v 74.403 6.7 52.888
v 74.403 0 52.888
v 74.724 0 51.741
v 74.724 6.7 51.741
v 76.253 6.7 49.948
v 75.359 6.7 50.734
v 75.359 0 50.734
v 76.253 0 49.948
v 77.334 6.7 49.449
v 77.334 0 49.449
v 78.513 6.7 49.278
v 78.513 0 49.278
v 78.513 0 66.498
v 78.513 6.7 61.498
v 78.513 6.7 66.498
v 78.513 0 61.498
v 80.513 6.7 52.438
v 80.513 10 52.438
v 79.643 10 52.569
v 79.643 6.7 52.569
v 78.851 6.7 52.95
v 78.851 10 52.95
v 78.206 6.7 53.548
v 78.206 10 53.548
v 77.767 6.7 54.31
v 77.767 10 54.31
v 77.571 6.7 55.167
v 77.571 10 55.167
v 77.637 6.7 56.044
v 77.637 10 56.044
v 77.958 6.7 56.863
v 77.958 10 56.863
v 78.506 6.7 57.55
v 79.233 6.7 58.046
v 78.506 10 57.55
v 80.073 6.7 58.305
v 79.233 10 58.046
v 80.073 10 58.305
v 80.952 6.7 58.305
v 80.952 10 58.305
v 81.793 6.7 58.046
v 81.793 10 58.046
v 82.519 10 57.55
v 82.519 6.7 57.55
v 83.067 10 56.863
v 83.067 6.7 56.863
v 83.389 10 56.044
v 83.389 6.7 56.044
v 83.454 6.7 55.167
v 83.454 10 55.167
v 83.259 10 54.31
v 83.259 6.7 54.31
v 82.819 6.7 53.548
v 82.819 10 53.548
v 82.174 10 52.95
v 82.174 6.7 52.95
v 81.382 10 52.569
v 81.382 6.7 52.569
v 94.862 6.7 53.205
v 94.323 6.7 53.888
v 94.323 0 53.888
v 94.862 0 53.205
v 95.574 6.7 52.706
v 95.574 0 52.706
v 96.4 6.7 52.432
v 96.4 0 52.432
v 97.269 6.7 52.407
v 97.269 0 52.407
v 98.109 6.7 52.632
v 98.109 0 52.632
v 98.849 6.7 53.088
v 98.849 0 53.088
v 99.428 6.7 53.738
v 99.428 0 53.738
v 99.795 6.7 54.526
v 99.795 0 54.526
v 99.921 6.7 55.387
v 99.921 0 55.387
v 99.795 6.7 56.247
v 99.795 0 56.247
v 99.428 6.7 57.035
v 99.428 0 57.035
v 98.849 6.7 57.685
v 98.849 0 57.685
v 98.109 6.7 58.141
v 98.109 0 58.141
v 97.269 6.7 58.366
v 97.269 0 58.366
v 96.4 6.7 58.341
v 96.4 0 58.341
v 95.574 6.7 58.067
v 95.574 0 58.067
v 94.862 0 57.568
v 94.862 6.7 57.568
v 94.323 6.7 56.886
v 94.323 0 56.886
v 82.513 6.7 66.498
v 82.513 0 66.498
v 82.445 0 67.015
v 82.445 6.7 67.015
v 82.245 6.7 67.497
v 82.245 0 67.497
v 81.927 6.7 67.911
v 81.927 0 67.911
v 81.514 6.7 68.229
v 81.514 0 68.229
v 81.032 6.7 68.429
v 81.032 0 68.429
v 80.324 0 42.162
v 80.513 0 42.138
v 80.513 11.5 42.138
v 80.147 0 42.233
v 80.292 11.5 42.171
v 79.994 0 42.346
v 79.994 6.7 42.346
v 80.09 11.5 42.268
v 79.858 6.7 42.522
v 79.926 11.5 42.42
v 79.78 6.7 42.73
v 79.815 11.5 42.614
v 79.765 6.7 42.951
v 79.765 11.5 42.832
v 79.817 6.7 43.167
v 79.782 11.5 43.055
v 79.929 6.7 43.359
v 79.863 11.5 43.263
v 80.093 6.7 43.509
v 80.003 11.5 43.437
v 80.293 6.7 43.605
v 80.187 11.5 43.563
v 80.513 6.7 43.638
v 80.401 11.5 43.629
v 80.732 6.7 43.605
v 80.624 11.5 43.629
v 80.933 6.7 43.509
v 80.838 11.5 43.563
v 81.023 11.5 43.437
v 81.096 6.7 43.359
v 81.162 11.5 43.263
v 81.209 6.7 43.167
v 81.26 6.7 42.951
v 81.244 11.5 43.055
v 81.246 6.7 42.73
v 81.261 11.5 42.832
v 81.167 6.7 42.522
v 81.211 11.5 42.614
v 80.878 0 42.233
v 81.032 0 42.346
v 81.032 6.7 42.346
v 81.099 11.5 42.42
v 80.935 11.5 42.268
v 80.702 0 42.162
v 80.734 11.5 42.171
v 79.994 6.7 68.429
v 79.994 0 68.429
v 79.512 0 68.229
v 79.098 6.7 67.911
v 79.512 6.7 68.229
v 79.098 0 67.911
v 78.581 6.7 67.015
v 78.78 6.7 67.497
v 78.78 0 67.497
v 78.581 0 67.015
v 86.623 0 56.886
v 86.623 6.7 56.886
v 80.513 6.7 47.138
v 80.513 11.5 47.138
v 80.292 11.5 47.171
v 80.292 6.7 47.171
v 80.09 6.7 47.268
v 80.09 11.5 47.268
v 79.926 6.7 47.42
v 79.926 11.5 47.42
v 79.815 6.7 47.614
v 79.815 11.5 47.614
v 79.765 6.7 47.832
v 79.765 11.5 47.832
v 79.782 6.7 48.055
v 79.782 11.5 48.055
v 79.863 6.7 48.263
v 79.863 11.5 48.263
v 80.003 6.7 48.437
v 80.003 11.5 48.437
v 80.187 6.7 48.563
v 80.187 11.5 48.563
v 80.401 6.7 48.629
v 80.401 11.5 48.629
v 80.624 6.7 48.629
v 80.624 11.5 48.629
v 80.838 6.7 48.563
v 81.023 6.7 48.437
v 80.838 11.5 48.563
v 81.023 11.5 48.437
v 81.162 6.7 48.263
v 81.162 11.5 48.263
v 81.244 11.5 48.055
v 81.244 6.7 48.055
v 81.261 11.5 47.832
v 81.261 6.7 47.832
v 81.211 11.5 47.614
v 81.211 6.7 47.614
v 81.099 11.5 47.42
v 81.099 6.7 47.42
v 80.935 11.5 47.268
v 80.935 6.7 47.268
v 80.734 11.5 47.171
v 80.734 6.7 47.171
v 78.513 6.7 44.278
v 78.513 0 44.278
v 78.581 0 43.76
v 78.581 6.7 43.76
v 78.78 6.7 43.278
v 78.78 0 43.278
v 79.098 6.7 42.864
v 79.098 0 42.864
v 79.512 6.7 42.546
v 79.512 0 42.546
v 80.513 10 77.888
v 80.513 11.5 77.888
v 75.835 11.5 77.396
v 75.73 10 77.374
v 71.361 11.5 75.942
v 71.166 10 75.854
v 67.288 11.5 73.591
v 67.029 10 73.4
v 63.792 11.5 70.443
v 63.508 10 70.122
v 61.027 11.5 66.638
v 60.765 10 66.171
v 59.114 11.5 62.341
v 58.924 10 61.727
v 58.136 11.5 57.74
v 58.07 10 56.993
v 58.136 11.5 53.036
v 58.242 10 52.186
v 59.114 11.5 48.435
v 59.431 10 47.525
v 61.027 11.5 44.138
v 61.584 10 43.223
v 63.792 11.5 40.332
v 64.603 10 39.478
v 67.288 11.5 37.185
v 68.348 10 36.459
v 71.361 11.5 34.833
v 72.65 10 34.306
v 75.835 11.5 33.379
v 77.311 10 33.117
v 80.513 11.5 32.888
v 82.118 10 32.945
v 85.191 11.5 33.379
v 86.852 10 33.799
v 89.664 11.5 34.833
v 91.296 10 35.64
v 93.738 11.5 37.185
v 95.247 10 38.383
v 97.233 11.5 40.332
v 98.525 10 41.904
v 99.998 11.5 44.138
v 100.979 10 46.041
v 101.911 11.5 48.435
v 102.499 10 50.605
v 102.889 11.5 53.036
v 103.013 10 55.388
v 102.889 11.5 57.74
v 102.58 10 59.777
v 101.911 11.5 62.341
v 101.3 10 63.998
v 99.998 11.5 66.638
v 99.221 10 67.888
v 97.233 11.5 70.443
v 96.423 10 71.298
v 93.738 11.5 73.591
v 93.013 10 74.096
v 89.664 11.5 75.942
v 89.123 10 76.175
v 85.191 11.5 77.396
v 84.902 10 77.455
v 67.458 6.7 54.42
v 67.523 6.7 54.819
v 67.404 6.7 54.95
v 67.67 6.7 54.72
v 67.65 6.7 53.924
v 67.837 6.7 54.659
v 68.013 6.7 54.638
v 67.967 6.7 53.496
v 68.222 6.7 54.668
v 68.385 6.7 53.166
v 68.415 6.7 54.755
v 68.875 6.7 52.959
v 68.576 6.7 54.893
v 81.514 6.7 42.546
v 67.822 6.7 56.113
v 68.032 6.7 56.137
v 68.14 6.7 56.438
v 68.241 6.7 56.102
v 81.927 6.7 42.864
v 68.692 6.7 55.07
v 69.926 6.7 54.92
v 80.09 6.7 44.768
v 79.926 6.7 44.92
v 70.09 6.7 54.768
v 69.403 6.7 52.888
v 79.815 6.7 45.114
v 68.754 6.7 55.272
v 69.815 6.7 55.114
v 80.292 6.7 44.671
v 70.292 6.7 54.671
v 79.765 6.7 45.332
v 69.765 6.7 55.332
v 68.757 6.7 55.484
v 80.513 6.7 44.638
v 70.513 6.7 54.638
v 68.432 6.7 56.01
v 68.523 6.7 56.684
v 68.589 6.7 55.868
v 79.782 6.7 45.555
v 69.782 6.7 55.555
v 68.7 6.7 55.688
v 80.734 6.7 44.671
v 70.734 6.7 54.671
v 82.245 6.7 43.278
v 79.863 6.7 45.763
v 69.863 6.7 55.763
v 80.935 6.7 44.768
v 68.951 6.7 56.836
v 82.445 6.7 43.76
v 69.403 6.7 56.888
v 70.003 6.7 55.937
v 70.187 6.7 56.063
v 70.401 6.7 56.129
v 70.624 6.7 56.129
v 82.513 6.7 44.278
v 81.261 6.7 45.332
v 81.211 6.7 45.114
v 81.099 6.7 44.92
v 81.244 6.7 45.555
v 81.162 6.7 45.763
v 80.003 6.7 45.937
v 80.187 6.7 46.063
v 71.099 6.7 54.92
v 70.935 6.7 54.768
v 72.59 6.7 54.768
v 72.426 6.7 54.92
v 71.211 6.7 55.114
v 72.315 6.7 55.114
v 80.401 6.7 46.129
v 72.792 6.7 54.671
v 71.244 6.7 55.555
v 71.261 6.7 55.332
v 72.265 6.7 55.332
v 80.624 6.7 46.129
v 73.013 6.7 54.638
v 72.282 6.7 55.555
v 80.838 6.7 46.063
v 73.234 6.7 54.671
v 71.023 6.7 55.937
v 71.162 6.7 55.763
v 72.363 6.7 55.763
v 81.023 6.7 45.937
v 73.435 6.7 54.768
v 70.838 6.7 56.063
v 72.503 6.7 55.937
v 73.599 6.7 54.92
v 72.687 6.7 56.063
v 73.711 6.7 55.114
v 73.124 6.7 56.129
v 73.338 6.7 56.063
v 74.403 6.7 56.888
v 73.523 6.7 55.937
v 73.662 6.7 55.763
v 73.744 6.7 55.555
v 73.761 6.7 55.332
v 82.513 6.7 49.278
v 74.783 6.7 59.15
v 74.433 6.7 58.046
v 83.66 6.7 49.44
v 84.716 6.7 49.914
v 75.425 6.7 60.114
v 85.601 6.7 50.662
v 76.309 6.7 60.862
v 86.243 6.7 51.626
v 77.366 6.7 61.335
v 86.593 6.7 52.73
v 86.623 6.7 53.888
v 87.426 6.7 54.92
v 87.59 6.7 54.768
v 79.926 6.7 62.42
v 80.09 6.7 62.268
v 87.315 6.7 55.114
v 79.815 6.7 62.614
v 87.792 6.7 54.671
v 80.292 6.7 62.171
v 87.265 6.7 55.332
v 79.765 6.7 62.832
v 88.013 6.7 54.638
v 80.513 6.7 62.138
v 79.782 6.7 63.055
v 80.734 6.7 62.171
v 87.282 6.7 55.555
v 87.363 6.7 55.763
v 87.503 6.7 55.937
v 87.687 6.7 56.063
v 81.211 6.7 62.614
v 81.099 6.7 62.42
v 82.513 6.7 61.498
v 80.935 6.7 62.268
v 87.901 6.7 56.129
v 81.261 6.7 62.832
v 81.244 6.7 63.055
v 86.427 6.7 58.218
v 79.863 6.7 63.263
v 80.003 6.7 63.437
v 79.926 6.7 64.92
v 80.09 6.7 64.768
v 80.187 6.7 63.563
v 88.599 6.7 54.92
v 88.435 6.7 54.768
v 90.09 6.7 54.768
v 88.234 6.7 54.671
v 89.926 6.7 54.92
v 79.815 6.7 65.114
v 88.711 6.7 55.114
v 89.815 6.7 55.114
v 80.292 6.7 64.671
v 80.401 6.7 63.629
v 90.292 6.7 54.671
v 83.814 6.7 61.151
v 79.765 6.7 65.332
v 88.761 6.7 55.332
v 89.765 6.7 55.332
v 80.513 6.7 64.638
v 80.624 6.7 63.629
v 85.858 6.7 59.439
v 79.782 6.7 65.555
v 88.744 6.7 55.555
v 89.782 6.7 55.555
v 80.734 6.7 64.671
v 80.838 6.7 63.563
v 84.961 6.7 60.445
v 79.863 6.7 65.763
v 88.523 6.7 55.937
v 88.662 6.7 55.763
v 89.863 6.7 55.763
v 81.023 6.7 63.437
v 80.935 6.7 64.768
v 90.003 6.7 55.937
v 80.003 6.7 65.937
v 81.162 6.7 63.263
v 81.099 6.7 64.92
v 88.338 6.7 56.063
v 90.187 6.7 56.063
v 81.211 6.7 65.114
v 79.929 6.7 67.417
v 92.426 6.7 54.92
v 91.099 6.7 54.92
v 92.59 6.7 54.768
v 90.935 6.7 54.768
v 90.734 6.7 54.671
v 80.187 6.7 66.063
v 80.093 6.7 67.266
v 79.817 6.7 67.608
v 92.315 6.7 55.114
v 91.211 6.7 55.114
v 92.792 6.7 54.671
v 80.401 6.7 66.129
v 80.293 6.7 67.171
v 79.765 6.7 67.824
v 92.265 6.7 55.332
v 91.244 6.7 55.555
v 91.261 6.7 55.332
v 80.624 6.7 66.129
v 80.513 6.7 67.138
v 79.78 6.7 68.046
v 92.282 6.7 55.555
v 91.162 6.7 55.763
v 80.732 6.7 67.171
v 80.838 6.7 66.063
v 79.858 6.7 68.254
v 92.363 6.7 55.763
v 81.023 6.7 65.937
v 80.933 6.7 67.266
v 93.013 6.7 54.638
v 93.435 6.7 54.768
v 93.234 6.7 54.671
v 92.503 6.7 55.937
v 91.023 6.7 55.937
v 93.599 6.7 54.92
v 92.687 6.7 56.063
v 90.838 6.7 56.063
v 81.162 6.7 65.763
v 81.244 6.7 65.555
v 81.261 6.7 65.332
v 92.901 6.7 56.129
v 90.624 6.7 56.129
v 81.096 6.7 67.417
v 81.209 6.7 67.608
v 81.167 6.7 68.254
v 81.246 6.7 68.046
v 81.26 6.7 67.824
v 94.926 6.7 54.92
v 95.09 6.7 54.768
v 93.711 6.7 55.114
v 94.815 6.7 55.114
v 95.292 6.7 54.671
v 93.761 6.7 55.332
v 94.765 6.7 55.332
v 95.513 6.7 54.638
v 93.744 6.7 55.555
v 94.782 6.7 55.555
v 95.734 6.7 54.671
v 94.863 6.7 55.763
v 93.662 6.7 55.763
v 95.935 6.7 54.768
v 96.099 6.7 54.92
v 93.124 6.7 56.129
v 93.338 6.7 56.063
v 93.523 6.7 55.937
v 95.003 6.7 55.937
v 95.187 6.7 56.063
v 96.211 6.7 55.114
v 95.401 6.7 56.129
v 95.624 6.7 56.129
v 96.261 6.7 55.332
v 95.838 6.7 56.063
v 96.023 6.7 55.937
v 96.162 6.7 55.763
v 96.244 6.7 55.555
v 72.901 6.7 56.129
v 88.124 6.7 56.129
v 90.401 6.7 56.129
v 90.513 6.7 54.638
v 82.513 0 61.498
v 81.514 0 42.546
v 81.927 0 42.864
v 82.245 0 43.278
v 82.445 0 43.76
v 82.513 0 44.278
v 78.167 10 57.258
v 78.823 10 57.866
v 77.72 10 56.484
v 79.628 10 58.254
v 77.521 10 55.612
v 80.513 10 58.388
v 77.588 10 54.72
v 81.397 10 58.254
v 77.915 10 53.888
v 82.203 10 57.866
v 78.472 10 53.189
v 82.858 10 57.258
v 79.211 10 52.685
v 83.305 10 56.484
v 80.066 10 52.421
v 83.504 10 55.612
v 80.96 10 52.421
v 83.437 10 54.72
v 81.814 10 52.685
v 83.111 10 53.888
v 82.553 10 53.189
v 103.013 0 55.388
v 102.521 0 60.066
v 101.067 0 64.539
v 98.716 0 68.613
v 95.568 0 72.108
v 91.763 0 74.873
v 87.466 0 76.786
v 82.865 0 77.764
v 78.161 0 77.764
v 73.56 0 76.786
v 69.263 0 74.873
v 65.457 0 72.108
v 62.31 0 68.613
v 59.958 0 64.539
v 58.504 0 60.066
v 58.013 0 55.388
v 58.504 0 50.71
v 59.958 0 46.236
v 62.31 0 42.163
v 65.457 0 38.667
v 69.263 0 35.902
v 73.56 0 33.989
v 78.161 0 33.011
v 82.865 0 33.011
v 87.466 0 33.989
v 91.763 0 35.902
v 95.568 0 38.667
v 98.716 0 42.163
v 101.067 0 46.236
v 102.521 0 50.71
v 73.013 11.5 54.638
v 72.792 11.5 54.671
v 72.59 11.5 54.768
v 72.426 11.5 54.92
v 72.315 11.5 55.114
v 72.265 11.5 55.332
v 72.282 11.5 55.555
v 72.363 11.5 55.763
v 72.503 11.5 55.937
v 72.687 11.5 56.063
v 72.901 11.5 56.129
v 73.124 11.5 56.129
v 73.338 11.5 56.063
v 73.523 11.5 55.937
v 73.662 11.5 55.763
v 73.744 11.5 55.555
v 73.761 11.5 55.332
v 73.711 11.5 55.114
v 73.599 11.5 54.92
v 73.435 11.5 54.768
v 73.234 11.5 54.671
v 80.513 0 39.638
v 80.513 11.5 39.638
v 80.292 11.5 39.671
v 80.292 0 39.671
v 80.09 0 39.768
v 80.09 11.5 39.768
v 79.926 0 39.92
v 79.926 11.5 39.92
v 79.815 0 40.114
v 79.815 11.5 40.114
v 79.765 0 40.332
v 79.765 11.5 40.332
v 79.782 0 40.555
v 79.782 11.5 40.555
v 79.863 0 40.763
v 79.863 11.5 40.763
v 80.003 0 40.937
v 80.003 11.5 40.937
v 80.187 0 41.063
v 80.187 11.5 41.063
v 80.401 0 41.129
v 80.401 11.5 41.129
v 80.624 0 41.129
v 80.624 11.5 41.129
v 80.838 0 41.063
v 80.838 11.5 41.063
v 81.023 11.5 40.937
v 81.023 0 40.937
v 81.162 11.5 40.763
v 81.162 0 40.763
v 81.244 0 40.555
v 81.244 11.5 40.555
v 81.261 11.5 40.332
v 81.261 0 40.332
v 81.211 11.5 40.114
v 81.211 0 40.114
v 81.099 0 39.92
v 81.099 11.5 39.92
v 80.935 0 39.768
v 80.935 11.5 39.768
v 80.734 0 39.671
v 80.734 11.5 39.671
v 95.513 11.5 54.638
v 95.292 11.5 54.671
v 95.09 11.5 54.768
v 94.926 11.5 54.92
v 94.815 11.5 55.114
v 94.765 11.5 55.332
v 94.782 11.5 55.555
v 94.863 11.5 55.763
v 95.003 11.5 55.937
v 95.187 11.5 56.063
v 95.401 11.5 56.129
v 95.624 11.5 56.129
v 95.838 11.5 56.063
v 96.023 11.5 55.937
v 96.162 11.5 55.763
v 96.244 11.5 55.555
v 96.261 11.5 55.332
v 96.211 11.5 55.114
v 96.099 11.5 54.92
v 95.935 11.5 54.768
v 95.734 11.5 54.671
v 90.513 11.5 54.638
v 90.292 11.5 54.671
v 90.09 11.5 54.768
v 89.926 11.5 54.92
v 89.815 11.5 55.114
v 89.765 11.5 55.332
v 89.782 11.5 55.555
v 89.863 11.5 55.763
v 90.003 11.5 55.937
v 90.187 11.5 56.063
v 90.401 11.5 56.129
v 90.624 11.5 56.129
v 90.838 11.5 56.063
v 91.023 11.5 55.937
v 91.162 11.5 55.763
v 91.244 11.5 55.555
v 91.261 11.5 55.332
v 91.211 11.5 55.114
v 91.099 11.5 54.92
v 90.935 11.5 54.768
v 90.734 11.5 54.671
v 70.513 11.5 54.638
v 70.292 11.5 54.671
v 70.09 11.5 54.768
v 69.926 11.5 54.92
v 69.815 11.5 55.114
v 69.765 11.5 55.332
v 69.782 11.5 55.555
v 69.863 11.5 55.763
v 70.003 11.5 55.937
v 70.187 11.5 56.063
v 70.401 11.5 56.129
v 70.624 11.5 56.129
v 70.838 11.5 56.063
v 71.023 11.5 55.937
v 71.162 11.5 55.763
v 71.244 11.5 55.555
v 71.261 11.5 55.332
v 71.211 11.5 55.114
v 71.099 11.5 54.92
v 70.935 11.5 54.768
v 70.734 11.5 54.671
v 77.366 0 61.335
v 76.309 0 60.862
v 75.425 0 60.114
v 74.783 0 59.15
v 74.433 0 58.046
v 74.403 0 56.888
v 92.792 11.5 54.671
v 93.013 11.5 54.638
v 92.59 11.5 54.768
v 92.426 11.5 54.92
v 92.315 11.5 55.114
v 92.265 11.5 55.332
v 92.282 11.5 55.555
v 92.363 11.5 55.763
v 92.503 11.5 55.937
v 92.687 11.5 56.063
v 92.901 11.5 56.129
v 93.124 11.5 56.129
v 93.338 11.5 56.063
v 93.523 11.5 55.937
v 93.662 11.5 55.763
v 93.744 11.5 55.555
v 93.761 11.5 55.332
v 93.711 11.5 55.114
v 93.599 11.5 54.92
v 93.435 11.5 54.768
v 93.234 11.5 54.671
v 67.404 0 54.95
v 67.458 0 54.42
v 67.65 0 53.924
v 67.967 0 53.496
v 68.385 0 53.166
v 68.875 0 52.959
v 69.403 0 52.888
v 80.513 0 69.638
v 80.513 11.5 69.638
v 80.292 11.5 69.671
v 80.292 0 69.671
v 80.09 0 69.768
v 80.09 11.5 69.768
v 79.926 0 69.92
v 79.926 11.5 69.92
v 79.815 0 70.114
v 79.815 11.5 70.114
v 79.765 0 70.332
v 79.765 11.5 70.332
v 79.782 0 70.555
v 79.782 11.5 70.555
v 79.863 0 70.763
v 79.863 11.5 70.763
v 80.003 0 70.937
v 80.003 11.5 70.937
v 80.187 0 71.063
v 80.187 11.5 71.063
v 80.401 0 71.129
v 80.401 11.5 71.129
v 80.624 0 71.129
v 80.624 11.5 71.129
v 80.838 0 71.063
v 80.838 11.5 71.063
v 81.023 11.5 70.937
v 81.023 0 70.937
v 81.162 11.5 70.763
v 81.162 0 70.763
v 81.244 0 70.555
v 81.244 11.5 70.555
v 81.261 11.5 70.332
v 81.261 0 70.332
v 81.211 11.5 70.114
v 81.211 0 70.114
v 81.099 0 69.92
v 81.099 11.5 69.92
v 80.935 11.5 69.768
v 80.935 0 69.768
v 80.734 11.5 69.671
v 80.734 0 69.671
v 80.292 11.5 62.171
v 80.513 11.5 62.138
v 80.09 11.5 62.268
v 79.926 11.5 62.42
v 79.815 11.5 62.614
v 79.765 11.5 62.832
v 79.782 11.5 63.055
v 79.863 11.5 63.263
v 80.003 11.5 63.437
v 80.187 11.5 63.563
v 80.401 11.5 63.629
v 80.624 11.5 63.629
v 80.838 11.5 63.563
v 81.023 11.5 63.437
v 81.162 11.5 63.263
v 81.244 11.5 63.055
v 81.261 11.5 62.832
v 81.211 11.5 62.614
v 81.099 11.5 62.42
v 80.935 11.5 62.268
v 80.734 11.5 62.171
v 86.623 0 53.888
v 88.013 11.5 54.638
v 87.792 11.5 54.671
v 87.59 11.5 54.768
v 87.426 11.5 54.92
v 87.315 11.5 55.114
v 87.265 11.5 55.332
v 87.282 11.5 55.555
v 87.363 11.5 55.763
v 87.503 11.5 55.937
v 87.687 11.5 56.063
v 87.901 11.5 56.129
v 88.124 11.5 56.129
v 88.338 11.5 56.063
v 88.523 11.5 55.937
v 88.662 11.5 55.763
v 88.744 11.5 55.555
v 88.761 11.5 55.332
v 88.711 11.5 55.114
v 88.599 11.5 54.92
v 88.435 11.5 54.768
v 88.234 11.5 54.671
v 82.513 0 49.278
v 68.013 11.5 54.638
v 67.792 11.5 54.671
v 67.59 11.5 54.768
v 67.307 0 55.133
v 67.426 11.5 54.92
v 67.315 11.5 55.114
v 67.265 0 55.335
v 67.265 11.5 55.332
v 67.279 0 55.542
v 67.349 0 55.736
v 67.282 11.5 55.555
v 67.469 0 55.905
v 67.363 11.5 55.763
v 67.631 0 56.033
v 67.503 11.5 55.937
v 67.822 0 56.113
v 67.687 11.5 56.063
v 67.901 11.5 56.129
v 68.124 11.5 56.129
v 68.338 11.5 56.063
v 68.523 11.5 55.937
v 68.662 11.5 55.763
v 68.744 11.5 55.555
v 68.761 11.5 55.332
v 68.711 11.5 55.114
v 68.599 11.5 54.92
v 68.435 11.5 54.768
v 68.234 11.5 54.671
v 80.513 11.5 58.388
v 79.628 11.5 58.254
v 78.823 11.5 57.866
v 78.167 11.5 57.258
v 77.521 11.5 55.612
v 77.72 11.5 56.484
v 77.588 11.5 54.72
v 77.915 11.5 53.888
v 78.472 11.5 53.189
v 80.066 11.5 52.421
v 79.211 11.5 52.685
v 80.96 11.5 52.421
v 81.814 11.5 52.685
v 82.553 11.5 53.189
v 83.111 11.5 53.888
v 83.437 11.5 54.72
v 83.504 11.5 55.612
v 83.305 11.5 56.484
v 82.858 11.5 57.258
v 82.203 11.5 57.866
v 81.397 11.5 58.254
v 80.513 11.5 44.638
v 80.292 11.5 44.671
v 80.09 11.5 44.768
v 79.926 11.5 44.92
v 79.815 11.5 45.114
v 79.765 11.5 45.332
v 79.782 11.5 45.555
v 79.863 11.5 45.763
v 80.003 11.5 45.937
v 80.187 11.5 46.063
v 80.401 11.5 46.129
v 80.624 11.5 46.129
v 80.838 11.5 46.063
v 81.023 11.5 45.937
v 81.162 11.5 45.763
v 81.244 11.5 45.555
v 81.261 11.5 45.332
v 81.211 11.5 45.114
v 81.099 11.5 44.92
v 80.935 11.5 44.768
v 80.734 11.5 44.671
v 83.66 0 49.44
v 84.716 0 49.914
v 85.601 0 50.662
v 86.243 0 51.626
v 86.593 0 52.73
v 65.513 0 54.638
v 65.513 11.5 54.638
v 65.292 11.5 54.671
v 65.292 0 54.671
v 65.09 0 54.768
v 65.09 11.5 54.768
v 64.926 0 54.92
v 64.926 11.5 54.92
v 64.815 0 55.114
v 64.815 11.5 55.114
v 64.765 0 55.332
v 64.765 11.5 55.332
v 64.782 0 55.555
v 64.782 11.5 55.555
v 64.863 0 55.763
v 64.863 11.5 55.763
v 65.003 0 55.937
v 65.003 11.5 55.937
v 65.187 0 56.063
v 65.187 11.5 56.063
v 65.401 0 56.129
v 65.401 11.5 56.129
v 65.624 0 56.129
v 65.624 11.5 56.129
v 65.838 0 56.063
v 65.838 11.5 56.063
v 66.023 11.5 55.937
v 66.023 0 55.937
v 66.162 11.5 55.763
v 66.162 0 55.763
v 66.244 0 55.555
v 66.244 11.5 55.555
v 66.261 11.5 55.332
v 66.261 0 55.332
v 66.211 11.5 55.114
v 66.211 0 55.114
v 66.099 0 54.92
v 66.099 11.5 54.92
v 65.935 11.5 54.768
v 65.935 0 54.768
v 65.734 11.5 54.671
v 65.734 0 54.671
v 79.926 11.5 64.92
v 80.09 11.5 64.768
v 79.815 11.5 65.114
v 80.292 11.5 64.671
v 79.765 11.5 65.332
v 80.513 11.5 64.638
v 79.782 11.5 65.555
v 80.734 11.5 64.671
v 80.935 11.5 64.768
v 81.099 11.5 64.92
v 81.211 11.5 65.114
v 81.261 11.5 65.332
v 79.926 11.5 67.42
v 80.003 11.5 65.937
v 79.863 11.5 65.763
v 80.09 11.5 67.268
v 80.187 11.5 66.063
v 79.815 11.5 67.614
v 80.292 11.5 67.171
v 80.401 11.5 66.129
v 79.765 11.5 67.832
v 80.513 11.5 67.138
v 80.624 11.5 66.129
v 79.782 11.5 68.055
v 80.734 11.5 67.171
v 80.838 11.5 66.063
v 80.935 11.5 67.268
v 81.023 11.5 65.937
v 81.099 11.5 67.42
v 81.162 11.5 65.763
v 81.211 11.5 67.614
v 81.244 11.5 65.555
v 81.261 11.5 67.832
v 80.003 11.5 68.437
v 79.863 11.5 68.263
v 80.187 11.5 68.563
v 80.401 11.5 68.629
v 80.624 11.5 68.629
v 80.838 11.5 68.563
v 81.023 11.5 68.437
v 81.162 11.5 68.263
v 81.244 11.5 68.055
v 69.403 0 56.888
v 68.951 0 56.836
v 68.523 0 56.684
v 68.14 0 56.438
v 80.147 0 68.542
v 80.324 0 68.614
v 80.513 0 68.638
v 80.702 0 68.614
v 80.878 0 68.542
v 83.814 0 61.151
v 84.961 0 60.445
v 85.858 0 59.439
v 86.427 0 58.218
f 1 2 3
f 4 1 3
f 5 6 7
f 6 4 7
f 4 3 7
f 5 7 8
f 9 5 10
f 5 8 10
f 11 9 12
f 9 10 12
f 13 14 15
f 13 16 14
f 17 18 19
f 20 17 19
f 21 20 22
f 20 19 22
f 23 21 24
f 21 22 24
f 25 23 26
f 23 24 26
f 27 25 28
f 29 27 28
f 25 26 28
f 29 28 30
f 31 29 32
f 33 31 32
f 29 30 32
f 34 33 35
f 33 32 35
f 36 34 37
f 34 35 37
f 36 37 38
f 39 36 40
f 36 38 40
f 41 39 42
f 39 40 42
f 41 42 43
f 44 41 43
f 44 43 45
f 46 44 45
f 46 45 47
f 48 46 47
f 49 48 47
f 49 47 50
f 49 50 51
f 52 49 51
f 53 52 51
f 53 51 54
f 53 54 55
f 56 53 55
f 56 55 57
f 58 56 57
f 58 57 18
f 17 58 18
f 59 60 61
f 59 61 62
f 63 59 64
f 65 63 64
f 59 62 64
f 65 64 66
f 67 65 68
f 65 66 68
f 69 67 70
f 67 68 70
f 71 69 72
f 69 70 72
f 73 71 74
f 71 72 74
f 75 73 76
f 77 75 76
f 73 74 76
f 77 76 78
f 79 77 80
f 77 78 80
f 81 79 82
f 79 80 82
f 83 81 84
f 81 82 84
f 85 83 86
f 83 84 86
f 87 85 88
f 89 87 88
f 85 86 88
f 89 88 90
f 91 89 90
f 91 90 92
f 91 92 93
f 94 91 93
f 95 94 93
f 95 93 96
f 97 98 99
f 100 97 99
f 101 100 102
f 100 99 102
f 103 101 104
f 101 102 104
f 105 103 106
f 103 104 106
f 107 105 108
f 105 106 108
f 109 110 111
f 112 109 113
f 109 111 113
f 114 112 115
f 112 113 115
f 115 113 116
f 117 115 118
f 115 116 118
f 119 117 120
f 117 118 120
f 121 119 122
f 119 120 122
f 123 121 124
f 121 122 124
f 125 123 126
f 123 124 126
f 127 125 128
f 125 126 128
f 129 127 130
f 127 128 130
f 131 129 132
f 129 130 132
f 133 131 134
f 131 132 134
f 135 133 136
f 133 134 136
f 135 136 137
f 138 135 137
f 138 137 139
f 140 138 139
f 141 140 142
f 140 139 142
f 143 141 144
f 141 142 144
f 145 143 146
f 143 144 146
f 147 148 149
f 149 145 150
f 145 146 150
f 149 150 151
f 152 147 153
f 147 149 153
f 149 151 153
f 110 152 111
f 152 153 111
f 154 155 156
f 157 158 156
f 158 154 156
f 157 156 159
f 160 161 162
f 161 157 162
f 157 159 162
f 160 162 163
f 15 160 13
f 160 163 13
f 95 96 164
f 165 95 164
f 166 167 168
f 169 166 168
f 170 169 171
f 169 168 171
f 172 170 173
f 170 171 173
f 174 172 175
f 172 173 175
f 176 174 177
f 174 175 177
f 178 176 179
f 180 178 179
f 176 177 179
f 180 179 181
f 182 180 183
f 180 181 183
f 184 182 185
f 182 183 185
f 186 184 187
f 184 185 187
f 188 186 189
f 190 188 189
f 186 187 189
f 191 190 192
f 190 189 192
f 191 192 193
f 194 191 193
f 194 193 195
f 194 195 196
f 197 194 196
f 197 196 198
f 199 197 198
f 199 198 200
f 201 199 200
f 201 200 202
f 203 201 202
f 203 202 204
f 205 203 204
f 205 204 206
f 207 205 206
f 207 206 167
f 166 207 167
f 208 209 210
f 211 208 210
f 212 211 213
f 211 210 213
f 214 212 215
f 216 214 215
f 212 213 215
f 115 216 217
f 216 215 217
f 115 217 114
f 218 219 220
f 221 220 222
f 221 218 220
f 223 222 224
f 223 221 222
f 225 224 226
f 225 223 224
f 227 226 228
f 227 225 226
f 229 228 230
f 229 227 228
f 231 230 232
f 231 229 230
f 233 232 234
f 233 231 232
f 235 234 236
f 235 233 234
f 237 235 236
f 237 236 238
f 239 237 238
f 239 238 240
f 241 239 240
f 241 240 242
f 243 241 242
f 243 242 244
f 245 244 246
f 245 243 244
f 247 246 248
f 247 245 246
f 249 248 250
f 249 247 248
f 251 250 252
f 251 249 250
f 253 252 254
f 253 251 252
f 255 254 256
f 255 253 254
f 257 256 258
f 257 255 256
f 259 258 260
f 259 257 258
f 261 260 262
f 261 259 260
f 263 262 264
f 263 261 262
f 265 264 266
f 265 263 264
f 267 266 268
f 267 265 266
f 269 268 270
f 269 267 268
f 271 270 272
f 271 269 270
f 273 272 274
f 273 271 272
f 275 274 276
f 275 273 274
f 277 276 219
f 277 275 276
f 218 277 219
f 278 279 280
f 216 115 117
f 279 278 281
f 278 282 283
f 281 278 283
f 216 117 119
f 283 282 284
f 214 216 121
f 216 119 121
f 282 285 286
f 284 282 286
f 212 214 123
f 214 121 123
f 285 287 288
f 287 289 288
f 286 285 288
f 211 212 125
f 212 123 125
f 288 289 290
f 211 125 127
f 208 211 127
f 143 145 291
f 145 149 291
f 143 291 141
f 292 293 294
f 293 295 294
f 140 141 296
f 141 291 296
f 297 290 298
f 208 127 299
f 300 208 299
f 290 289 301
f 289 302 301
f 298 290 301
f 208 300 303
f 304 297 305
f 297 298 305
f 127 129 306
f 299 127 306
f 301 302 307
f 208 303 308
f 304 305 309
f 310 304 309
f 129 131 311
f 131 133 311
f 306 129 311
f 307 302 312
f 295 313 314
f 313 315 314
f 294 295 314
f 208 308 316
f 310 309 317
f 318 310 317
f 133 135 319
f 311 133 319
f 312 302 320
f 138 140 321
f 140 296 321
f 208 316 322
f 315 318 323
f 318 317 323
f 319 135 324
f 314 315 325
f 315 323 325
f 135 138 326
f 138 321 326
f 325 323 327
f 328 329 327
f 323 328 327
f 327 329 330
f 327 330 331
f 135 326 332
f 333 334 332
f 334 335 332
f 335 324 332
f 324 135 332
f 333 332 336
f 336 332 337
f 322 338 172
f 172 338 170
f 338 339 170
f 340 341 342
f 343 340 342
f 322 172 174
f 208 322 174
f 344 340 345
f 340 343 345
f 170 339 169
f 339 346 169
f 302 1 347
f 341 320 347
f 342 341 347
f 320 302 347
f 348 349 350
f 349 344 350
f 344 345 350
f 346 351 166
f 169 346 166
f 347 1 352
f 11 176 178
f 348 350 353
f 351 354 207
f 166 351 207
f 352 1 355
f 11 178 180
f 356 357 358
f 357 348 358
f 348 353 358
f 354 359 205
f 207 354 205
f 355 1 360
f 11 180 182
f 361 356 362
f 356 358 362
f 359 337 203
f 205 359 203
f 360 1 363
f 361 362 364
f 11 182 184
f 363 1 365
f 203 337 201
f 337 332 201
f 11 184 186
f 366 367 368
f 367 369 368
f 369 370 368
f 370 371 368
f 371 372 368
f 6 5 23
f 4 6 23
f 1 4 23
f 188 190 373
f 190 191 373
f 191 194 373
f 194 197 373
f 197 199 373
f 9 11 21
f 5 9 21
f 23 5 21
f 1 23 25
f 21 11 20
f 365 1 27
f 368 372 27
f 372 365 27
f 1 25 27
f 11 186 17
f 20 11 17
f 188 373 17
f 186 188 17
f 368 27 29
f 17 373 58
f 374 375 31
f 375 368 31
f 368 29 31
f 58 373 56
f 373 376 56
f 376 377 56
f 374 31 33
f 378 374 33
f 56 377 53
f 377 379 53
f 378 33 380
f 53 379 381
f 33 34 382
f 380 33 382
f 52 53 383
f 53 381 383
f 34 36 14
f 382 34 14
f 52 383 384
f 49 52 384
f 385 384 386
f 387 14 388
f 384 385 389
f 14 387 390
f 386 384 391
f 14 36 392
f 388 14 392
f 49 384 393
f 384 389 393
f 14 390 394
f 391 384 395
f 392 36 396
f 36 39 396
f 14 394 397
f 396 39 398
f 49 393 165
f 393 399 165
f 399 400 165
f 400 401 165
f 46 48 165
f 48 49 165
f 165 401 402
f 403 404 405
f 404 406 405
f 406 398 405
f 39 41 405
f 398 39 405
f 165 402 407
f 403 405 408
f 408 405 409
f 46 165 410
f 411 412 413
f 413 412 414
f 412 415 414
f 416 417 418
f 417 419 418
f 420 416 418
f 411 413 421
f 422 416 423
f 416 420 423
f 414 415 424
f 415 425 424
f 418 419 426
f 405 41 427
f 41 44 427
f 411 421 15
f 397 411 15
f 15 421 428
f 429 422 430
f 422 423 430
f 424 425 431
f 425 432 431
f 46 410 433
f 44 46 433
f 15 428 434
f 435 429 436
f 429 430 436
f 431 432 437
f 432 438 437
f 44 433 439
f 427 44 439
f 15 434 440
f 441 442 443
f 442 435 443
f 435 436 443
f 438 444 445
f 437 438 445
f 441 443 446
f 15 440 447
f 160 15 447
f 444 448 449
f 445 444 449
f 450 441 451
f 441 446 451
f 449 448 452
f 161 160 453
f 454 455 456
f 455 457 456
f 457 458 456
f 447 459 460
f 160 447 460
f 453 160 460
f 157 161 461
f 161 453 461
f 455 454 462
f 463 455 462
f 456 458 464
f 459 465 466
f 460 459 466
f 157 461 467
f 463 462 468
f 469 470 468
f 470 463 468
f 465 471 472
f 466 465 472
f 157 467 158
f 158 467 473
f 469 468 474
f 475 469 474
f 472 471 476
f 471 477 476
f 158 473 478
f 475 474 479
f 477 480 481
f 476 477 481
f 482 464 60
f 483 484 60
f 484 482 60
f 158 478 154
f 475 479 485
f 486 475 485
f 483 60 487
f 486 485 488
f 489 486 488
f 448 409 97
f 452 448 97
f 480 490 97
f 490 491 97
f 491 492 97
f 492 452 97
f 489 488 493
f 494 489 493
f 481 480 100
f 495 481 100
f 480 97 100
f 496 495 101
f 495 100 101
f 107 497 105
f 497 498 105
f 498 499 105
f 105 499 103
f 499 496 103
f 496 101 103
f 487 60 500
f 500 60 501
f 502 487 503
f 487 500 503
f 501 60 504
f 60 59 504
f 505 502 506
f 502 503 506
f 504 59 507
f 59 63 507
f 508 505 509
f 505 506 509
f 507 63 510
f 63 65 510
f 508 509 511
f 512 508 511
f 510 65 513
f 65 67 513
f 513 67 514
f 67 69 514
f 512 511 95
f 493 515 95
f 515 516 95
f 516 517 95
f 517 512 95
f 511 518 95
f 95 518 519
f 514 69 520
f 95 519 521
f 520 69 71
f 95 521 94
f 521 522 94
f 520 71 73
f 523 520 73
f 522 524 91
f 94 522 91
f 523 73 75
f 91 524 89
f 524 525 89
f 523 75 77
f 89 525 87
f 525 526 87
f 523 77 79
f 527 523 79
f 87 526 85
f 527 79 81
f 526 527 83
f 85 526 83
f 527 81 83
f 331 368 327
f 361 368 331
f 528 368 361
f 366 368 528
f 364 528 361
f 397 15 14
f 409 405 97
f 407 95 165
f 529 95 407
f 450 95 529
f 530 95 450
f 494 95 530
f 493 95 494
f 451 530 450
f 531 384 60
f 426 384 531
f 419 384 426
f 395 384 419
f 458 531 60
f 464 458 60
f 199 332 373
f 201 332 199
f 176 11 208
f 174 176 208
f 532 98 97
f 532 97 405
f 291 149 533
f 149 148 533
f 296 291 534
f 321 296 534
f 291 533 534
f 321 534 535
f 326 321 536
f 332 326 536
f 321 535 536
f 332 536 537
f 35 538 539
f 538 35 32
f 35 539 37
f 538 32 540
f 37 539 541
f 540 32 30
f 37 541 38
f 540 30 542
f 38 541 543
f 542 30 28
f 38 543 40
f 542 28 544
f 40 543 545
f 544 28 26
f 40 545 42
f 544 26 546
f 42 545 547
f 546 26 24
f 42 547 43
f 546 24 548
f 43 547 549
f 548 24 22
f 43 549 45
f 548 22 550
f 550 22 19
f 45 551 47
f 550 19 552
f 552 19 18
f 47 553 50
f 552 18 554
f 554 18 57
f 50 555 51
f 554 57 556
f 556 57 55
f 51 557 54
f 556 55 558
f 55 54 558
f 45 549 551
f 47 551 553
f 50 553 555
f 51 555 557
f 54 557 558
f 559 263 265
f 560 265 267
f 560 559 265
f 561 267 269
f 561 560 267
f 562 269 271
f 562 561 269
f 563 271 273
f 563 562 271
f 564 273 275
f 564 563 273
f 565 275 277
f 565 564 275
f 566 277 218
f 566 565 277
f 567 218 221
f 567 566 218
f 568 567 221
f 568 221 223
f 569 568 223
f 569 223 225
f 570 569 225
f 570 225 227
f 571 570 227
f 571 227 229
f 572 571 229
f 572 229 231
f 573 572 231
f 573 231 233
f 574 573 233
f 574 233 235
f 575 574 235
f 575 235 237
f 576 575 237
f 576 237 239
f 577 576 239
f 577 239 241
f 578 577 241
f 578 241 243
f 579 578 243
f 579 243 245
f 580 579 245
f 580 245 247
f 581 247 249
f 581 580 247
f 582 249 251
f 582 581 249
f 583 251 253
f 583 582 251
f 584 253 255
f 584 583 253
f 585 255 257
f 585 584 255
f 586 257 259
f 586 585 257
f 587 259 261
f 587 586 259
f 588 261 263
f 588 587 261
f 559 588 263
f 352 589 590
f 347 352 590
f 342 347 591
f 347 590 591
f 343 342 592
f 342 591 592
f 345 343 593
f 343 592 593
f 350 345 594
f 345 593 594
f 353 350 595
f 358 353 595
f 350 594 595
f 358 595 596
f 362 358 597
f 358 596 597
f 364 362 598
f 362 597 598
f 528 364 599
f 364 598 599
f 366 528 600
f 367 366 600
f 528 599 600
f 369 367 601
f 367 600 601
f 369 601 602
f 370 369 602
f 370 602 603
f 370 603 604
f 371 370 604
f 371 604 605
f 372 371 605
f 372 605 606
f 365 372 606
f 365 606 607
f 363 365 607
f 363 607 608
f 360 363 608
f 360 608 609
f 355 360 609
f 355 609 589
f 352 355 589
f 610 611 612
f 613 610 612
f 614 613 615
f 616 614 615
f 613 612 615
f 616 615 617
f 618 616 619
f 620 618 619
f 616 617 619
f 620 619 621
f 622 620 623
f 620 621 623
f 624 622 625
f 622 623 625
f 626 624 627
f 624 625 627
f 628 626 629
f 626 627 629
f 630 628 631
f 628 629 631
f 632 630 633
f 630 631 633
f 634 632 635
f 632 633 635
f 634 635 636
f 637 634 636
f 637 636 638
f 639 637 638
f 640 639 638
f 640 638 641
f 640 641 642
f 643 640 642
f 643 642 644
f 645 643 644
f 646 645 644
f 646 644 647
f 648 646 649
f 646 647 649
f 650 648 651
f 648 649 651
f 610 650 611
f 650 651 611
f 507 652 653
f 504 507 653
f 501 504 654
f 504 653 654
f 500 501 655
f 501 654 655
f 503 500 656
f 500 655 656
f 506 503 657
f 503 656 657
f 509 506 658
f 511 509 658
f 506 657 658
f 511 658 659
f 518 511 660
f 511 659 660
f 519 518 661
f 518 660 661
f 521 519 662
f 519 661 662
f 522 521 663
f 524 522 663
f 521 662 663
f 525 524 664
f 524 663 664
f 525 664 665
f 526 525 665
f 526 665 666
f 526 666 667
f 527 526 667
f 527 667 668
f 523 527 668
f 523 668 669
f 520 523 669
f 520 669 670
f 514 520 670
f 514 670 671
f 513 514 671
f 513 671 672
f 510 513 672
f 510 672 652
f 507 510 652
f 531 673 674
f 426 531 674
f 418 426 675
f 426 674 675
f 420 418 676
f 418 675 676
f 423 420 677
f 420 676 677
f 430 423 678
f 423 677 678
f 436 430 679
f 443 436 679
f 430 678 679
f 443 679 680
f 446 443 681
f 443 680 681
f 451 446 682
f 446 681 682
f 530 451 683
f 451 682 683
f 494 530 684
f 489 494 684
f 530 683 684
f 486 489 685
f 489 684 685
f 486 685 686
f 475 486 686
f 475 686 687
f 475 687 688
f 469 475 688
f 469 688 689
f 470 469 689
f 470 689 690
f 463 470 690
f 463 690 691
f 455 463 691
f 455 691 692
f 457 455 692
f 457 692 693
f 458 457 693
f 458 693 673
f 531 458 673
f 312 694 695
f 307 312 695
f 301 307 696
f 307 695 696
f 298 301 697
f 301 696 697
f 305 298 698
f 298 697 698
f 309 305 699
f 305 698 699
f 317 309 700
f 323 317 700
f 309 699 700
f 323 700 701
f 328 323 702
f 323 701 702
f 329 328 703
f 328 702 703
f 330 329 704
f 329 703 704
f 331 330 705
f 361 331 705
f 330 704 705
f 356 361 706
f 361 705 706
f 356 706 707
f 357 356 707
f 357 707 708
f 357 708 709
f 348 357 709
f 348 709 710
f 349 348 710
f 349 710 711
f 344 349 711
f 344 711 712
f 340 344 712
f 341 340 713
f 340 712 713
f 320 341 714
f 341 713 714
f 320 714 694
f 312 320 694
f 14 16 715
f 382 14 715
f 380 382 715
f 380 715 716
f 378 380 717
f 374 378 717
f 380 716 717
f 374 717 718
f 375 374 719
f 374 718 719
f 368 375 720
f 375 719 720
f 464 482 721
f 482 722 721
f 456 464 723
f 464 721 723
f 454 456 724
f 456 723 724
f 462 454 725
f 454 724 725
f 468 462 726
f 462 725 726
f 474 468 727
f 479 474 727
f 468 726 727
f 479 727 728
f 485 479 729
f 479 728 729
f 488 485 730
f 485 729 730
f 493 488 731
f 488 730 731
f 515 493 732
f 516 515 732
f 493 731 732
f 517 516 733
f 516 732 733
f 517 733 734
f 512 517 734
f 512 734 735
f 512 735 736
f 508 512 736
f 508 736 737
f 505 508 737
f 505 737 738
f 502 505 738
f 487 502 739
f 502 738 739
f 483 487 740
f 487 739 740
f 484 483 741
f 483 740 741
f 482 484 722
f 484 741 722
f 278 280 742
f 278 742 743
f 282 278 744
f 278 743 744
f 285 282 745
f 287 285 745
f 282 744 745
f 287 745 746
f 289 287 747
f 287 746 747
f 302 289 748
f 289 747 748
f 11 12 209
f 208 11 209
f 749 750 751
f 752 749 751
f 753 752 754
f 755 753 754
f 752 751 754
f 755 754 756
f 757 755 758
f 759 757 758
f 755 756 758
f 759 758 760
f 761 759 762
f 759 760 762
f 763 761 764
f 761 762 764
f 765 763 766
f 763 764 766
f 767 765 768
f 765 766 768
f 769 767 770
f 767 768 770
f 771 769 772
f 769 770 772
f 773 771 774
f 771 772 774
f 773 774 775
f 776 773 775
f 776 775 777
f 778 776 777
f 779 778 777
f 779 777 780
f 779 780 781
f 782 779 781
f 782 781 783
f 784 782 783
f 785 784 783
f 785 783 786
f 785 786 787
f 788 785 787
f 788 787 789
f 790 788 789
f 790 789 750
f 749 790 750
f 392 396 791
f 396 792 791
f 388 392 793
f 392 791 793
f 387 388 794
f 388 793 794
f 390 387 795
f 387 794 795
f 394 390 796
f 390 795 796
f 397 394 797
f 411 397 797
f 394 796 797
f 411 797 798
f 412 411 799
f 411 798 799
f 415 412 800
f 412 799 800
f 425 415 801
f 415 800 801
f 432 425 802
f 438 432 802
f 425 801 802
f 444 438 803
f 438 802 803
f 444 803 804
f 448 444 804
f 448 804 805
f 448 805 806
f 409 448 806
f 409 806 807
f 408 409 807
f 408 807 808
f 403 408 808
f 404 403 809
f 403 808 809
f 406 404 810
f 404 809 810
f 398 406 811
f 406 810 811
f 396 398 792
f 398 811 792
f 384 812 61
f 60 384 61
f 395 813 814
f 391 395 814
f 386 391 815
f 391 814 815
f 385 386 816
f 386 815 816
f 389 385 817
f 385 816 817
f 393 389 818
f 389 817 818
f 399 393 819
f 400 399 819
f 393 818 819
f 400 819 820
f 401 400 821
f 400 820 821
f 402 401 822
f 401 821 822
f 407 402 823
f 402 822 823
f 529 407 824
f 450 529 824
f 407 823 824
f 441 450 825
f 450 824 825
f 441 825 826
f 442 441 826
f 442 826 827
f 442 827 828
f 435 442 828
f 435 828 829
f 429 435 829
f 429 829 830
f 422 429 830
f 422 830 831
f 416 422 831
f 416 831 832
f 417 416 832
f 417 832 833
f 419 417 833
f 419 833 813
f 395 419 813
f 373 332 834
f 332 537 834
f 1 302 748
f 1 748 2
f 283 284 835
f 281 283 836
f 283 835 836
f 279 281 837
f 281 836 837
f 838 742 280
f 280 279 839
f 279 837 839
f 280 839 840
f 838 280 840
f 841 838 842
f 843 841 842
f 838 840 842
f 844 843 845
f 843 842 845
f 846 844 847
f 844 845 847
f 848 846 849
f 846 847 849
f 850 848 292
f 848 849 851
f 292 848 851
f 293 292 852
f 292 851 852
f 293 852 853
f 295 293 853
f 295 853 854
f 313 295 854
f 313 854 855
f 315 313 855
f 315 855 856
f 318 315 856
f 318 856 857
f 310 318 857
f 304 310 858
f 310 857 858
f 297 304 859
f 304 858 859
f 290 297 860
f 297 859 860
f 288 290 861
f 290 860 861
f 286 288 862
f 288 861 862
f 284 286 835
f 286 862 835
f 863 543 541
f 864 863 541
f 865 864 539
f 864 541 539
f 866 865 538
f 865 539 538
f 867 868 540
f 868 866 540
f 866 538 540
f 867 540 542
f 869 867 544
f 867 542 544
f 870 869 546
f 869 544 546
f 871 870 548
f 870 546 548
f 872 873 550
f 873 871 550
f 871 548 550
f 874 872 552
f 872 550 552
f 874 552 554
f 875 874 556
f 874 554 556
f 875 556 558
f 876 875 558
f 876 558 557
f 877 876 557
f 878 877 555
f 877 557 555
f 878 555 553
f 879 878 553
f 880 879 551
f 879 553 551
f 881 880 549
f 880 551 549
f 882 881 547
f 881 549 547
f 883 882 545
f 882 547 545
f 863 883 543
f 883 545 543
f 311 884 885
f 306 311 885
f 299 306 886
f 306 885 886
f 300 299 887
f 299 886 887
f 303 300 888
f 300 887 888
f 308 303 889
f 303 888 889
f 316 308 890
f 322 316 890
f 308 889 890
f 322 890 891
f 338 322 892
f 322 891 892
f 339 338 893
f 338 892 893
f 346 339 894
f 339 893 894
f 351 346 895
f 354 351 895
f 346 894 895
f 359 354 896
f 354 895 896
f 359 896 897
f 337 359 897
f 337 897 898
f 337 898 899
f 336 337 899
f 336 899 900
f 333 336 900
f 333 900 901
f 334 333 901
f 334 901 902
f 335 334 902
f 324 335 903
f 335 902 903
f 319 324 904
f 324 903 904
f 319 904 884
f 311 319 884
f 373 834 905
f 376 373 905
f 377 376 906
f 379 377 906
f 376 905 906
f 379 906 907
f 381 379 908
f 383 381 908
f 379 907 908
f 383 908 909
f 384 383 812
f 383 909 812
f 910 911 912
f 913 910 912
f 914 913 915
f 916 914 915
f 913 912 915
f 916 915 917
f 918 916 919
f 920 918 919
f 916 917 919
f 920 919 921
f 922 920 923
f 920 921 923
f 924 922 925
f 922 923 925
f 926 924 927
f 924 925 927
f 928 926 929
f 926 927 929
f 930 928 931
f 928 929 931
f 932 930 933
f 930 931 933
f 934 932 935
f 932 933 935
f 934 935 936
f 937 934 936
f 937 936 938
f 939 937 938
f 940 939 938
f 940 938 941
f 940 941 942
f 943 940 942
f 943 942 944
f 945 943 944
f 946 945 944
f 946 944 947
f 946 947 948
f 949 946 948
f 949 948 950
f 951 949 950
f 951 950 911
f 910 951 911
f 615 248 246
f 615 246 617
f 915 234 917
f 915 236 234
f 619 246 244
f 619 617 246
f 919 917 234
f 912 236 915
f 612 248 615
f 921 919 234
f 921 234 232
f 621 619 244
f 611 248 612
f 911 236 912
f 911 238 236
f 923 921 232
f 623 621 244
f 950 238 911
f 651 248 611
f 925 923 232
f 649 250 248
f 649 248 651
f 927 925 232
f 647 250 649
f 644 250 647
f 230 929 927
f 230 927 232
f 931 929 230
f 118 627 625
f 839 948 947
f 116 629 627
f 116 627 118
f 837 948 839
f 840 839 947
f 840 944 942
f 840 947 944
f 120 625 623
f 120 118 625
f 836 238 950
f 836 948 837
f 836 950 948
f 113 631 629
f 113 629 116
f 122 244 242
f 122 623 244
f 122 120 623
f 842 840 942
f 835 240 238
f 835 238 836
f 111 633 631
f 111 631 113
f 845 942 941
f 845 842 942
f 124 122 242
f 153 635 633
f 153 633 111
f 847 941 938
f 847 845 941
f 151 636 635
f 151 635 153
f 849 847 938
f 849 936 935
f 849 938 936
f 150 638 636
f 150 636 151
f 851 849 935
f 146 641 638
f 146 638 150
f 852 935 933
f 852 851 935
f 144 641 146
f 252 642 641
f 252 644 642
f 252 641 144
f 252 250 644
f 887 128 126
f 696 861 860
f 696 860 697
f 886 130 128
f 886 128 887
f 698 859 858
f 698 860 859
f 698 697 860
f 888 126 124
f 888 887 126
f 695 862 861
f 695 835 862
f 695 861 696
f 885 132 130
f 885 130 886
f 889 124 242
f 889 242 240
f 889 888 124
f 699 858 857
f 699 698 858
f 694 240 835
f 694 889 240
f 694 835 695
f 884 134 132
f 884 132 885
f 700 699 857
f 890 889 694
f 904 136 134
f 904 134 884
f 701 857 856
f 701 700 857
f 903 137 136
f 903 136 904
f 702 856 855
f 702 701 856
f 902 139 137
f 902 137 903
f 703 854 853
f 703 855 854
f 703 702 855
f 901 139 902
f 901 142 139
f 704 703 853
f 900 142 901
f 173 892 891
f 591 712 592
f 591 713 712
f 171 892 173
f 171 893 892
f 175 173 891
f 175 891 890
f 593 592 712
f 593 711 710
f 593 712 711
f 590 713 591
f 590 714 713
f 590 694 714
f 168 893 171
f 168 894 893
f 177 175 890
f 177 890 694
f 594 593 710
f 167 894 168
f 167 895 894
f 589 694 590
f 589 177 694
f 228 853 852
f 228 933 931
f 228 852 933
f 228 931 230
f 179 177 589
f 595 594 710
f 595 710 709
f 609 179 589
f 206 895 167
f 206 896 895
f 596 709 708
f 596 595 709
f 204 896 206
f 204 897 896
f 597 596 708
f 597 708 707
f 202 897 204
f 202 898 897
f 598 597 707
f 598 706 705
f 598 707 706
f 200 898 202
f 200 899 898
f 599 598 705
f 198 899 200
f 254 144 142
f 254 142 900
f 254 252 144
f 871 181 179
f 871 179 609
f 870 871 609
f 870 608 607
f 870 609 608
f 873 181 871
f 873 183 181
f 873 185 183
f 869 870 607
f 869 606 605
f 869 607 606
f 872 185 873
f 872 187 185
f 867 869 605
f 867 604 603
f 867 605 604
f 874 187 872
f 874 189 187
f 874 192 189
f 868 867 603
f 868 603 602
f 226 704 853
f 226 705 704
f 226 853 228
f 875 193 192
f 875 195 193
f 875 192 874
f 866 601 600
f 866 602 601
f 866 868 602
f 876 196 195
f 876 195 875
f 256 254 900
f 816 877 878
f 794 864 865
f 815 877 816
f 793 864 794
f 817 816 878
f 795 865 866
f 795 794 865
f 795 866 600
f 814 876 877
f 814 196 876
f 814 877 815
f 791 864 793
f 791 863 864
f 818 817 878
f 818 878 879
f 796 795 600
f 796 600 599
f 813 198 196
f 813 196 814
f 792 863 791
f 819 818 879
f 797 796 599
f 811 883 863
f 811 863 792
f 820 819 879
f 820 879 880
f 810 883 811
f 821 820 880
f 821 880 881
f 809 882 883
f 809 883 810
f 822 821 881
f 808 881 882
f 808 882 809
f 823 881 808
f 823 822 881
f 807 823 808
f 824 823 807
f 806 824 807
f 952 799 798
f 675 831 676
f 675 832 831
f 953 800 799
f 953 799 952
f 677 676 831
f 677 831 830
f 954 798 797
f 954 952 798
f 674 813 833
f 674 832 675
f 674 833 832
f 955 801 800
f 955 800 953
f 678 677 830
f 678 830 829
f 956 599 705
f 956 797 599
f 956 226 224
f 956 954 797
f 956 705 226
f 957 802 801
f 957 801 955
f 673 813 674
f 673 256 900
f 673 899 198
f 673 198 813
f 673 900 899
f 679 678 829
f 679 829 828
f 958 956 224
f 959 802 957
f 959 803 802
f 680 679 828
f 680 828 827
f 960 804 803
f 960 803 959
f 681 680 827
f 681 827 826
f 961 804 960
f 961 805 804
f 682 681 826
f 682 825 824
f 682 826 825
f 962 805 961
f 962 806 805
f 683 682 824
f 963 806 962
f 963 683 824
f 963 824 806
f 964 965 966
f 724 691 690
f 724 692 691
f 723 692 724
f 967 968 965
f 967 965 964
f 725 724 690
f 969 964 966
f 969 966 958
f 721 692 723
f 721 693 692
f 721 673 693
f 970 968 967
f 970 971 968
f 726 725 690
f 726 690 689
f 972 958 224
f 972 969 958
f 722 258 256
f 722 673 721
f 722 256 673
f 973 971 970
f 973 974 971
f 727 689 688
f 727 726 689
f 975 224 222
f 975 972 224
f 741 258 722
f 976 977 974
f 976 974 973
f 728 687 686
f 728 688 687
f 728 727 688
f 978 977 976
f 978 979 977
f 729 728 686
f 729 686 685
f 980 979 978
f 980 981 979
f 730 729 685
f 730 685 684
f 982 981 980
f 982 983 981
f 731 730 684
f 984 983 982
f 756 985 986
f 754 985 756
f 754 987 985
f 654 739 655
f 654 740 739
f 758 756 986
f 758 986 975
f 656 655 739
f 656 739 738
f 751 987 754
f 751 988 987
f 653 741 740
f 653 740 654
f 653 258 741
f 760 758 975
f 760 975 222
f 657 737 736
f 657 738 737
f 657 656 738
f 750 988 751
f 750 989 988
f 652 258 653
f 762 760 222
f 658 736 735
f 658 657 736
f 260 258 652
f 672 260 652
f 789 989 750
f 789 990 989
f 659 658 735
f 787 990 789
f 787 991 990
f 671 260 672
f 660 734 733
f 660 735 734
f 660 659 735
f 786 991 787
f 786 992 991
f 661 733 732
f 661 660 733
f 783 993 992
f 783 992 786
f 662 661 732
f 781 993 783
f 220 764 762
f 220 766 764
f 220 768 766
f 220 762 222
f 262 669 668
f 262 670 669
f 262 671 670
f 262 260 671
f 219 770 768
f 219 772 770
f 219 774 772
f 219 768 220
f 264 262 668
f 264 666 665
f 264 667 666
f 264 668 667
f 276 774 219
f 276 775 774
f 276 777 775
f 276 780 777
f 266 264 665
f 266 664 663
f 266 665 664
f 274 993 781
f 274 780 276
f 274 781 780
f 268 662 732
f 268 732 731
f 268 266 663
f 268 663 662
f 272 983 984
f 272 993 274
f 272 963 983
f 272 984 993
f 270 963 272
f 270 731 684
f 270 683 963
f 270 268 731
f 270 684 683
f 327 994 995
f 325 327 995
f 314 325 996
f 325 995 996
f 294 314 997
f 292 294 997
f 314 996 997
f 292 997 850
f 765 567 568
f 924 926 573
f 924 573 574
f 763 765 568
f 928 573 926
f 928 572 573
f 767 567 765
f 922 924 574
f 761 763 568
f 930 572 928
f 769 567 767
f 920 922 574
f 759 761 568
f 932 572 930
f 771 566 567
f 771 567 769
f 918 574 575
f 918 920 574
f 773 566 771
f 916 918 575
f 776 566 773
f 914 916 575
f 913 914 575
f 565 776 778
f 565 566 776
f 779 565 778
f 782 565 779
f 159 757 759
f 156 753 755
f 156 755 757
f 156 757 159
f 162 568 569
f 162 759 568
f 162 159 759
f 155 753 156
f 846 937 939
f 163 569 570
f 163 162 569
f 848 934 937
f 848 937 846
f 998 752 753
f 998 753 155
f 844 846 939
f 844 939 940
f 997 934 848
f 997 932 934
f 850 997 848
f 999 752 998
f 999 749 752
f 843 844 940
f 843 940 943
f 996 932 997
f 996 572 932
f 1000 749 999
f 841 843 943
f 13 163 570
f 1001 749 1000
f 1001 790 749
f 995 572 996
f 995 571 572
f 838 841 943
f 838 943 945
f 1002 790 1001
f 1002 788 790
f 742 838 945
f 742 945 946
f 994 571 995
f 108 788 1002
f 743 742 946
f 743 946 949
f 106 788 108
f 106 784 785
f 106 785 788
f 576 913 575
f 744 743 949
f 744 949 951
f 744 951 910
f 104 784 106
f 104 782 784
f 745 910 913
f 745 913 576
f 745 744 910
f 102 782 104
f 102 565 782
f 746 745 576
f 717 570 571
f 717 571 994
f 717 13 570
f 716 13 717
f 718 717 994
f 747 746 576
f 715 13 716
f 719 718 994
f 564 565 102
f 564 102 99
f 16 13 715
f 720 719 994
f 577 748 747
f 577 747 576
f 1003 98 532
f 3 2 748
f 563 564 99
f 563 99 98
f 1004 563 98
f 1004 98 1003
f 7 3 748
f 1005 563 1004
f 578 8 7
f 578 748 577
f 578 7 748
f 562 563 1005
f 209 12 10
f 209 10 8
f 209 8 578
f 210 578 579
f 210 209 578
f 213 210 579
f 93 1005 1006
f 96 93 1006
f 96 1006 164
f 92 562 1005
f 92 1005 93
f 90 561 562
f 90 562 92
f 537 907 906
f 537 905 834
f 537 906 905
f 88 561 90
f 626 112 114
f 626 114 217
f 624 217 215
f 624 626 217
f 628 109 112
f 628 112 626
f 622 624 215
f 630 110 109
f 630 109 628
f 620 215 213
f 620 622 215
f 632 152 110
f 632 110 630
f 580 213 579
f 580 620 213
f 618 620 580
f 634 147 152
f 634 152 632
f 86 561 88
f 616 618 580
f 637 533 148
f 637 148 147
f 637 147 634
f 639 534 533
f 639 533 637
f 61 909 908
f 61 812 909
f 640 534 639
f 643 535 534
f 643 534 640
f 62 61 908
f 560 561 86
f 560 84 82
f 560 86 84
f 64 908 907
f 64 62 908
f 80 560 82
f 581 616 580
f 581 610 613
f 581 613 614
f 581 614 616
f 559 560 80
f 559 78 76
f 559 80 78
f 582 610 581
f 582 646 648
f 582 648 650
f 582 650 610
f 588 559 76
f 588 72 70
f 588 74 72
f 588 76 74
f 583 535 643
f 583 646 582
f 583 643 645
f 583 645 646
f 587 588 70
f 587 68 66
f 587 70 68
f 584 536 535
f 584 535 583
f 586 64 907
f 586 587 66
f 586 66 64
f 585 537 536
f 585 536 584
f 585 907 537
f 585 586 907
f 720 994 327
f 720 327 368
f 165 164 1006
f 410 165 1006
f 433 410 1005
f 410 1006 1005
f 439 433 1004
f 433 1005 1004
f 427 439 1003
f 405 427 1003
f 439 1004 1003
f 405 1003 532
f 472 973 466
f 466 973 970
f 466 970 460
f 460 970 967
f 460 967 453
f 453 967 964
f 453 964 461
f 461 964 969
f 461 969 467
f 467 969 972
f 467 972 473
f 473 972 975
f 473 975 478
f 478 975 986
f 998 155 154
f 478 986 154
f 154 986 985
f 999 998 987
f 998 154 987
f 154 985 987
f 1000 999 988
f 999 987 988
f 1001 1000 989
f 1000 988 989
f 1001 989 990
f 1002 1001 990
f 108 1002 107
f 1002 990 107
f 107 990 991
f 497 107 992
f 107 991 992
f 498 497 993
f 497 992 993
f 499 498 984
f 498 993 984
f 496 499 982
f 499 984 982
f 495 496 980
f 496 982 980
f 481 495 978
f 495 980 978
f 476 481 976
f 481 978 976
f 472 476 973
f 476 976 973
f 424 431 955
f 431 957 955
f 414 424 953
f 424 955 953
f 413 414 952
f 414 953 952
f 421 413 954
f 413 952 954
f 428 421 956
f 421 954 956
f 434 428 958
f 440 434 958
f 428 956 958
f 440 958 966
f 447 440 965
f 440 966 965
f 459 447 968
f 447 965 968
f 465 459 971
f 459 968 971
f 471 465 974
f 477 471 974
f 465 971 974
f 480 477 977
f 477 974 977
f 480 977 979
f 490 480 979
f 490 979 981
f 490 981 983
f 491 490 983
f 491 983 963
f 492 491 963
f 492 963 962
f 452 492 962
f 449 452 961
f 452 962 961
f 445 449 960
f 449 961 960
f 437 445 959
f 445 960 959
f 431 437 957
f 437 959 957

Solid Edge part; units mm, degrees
sketch "Sketch1" plane through (0, 0, 0) normal (0, -1, 0) x (1, 0, 0)
  circle A0 centre (80.5127, 55.3877) radius 22.5
  dimension "D1" = 45
extrude "Protrusion1" add sketch "Sketch1" against normal blind 10
sketch "Sketch2" plane through (80.5127, 10, 55.3877) normal (0, 1, 0) x (0, 0, -1)
  circle A0 centre (0, 0) radius 2.95
  dimension "D1" = 5.9
extrude "ExtrudedCutout_5" cut sketch "Sketch2" against normal blind 4
sketch "Sketch3" plane through (80.5127, 6, 55.3877) normal (0, 1, 0) x (-1, 0, 0)
  circle A0 centre (0, 0) radius 1.05
  dimension "D1" = 2.1
extrude "Cutout1" cut sketch "Sketch3" against normal up to next
sketch "Sketch4" plane through (80.5127, 5, 51.1598) normal (0, -1, 0) x (1, 0, 0)
  circle A0 centre (0, 4.2279) radius 3.55
extrude "ExtrudedCutout_7" cut sketch "Sketch4" against normal blind 0.5
chamfer "Chamfer_2" distance 1.9 distance2 0.5 1 edges at (80.5127, 6, 58.3377) measured on face at (78.605, 6, 53.362)
sketch "Sketch5" plane through (80.5127, 10, 55.3877) normal (0, 1, 0) x (0, 0, 1)
  circle A0 centre (0, 0) radius 22.5
  circle A1 centre (0, 0) radius 3
  dimension "D1" = 45
extrude "ExtrudedProtrusion_4" add sketch "Sketch5" along normal blind 1.5
sketch "Sketch6" plane through (80.5127, 0, 55.3877) normal (0, -1, 0) x (0, 0, 1)
  line L0 (1.5, 11.11) -> (1.5, 6.11)
  arc A0 (6.11, 2) -> (1.5, 6.11) centre (1.9729, 2) ccw
  line L1 (6.11, 2) -> (11.11, 2)
  arc A1 (11.11, 2) -> (11.11, -2) centre (11.11, 0) cw
  line L2 (11.11, -2) -> (6.11, -2)
  arc A2 (1.4978, -6.11) -> (6.11, -2) centre (1.4978, -1.4671) ccw
  line L3 (1.4978, -13.81) -> (1.4978, -6.11)
  arc A3 (-1.5, -13.81) -> (1.4978, -13.81) centre (-0.0011, -16.4087) ccw
  line L4 (-1.5, -6.11) -> (-1.5, -13.81)
  arc A4 (-6.11, -2) -> (-1.5, -6.11) centre (-1.9729, -2) ccw
  line L5 (-11.11, -2) -> (-6.11, -2)
  arc A5 (-11.11, 2) -> (-11.11, -2) centre (-11.11, 0) ccw
  line L6 (-6.11, 2) -> (-11.11, 2)
  arc A6 (-6.11, 2) -> (-2.5, 6.11) centre (-1.9654, 2) cw
  line L7 (-2.5, 11.11) -> (-2.5, 6.11)
  arc A7 (1.5, 11.11) -> (-2.5, 11.11) centre (-0.5, 11.11) ccw
  dimension "D1" = 5
  dimension "D2" = 6.11
  dimension "D3" = 1.5
  dimension "D4" = 2
  dimension "D5" = 5
  dimension "D6" = 5
  dimension "D7" = 2
  dimension "D8" = 5
  dimension "D9" = 5
  dimension "D10" = 2
  dimension "D11" = 6.11
  dimension "D12" = 6.11
  dimension "D13" = 7.7
  dimension "D14" = 6.11
  dimension "D15" = 1.5
  dimension "D16" = 7.7
  dimension "D17" = 5
  dimension "D18" = 3
extrude "ExtrudedCutout_9" cut sketch "Sketch6" against normal blind 6.7
sketch "Sketch7" plane through (80.5127, 11.5, 55.3877) normal (0, 1, 0) x (0, 0, -1)
  circle A0 centre (7.5, 0) radius 0.75
  circle A1 centre (10, 0) radius 0.75
  circle A2 centre (12.5, 0) radius 0.75
  circle A3 centre (15, 0) radius 0.75
  circle A4 centre (-15, 0) radius 0.75
  circle A5 centre (-12.5, 0) radius 0.75
  circle A6 centre (-10, 0) radius 0.75
  circle A7 centre (-7.5, 0) radius 0.75
  circle A8 centre (0, -10) radius 0.75
  circle A9 centre (0, -12.5) radius 0.75
  circle A10 centre (0, -15) radius 0.75
  circle A11 centre (0, -7.5) radius 0.75
  circle A12 centre (0, 7.5) radius 0.75
  circle A13 centre (0, 10) radius 0.75
  circle A14 centre (0, 12.5) radius 0.75
  circle A15 centre (0, 15) radius 0.75
  dimension "D1" = 7.5
  dimension "D2" = 1.5
  dimension "D3" = 10
  dimension "D4" = 1.5
  dimension "D5" = 12.5
  dimension "D6" = 15
  dimension "D7" = 7.5
  dimension "D8" = 10
  dimension "D9" = 12.5
  dimension "D10" = 15
  dimension "D11" = 1.5
  dimension "D12" = 7.5
  dimension "D13" = 10
  dimension "D14" = 12.5
  dimension "D15" = 15
  dimension "D16" = 1.5
  dimension "D17" = 1.5
  dimension "D18" = 7.5
  dimension "D19" = 10
  dimension "D20" = 12.5
  dimension "D21" = 1.5
  dimension "D22" = 15
extrude "Cutout2" cut sketch "Sketch7" against normal through all
